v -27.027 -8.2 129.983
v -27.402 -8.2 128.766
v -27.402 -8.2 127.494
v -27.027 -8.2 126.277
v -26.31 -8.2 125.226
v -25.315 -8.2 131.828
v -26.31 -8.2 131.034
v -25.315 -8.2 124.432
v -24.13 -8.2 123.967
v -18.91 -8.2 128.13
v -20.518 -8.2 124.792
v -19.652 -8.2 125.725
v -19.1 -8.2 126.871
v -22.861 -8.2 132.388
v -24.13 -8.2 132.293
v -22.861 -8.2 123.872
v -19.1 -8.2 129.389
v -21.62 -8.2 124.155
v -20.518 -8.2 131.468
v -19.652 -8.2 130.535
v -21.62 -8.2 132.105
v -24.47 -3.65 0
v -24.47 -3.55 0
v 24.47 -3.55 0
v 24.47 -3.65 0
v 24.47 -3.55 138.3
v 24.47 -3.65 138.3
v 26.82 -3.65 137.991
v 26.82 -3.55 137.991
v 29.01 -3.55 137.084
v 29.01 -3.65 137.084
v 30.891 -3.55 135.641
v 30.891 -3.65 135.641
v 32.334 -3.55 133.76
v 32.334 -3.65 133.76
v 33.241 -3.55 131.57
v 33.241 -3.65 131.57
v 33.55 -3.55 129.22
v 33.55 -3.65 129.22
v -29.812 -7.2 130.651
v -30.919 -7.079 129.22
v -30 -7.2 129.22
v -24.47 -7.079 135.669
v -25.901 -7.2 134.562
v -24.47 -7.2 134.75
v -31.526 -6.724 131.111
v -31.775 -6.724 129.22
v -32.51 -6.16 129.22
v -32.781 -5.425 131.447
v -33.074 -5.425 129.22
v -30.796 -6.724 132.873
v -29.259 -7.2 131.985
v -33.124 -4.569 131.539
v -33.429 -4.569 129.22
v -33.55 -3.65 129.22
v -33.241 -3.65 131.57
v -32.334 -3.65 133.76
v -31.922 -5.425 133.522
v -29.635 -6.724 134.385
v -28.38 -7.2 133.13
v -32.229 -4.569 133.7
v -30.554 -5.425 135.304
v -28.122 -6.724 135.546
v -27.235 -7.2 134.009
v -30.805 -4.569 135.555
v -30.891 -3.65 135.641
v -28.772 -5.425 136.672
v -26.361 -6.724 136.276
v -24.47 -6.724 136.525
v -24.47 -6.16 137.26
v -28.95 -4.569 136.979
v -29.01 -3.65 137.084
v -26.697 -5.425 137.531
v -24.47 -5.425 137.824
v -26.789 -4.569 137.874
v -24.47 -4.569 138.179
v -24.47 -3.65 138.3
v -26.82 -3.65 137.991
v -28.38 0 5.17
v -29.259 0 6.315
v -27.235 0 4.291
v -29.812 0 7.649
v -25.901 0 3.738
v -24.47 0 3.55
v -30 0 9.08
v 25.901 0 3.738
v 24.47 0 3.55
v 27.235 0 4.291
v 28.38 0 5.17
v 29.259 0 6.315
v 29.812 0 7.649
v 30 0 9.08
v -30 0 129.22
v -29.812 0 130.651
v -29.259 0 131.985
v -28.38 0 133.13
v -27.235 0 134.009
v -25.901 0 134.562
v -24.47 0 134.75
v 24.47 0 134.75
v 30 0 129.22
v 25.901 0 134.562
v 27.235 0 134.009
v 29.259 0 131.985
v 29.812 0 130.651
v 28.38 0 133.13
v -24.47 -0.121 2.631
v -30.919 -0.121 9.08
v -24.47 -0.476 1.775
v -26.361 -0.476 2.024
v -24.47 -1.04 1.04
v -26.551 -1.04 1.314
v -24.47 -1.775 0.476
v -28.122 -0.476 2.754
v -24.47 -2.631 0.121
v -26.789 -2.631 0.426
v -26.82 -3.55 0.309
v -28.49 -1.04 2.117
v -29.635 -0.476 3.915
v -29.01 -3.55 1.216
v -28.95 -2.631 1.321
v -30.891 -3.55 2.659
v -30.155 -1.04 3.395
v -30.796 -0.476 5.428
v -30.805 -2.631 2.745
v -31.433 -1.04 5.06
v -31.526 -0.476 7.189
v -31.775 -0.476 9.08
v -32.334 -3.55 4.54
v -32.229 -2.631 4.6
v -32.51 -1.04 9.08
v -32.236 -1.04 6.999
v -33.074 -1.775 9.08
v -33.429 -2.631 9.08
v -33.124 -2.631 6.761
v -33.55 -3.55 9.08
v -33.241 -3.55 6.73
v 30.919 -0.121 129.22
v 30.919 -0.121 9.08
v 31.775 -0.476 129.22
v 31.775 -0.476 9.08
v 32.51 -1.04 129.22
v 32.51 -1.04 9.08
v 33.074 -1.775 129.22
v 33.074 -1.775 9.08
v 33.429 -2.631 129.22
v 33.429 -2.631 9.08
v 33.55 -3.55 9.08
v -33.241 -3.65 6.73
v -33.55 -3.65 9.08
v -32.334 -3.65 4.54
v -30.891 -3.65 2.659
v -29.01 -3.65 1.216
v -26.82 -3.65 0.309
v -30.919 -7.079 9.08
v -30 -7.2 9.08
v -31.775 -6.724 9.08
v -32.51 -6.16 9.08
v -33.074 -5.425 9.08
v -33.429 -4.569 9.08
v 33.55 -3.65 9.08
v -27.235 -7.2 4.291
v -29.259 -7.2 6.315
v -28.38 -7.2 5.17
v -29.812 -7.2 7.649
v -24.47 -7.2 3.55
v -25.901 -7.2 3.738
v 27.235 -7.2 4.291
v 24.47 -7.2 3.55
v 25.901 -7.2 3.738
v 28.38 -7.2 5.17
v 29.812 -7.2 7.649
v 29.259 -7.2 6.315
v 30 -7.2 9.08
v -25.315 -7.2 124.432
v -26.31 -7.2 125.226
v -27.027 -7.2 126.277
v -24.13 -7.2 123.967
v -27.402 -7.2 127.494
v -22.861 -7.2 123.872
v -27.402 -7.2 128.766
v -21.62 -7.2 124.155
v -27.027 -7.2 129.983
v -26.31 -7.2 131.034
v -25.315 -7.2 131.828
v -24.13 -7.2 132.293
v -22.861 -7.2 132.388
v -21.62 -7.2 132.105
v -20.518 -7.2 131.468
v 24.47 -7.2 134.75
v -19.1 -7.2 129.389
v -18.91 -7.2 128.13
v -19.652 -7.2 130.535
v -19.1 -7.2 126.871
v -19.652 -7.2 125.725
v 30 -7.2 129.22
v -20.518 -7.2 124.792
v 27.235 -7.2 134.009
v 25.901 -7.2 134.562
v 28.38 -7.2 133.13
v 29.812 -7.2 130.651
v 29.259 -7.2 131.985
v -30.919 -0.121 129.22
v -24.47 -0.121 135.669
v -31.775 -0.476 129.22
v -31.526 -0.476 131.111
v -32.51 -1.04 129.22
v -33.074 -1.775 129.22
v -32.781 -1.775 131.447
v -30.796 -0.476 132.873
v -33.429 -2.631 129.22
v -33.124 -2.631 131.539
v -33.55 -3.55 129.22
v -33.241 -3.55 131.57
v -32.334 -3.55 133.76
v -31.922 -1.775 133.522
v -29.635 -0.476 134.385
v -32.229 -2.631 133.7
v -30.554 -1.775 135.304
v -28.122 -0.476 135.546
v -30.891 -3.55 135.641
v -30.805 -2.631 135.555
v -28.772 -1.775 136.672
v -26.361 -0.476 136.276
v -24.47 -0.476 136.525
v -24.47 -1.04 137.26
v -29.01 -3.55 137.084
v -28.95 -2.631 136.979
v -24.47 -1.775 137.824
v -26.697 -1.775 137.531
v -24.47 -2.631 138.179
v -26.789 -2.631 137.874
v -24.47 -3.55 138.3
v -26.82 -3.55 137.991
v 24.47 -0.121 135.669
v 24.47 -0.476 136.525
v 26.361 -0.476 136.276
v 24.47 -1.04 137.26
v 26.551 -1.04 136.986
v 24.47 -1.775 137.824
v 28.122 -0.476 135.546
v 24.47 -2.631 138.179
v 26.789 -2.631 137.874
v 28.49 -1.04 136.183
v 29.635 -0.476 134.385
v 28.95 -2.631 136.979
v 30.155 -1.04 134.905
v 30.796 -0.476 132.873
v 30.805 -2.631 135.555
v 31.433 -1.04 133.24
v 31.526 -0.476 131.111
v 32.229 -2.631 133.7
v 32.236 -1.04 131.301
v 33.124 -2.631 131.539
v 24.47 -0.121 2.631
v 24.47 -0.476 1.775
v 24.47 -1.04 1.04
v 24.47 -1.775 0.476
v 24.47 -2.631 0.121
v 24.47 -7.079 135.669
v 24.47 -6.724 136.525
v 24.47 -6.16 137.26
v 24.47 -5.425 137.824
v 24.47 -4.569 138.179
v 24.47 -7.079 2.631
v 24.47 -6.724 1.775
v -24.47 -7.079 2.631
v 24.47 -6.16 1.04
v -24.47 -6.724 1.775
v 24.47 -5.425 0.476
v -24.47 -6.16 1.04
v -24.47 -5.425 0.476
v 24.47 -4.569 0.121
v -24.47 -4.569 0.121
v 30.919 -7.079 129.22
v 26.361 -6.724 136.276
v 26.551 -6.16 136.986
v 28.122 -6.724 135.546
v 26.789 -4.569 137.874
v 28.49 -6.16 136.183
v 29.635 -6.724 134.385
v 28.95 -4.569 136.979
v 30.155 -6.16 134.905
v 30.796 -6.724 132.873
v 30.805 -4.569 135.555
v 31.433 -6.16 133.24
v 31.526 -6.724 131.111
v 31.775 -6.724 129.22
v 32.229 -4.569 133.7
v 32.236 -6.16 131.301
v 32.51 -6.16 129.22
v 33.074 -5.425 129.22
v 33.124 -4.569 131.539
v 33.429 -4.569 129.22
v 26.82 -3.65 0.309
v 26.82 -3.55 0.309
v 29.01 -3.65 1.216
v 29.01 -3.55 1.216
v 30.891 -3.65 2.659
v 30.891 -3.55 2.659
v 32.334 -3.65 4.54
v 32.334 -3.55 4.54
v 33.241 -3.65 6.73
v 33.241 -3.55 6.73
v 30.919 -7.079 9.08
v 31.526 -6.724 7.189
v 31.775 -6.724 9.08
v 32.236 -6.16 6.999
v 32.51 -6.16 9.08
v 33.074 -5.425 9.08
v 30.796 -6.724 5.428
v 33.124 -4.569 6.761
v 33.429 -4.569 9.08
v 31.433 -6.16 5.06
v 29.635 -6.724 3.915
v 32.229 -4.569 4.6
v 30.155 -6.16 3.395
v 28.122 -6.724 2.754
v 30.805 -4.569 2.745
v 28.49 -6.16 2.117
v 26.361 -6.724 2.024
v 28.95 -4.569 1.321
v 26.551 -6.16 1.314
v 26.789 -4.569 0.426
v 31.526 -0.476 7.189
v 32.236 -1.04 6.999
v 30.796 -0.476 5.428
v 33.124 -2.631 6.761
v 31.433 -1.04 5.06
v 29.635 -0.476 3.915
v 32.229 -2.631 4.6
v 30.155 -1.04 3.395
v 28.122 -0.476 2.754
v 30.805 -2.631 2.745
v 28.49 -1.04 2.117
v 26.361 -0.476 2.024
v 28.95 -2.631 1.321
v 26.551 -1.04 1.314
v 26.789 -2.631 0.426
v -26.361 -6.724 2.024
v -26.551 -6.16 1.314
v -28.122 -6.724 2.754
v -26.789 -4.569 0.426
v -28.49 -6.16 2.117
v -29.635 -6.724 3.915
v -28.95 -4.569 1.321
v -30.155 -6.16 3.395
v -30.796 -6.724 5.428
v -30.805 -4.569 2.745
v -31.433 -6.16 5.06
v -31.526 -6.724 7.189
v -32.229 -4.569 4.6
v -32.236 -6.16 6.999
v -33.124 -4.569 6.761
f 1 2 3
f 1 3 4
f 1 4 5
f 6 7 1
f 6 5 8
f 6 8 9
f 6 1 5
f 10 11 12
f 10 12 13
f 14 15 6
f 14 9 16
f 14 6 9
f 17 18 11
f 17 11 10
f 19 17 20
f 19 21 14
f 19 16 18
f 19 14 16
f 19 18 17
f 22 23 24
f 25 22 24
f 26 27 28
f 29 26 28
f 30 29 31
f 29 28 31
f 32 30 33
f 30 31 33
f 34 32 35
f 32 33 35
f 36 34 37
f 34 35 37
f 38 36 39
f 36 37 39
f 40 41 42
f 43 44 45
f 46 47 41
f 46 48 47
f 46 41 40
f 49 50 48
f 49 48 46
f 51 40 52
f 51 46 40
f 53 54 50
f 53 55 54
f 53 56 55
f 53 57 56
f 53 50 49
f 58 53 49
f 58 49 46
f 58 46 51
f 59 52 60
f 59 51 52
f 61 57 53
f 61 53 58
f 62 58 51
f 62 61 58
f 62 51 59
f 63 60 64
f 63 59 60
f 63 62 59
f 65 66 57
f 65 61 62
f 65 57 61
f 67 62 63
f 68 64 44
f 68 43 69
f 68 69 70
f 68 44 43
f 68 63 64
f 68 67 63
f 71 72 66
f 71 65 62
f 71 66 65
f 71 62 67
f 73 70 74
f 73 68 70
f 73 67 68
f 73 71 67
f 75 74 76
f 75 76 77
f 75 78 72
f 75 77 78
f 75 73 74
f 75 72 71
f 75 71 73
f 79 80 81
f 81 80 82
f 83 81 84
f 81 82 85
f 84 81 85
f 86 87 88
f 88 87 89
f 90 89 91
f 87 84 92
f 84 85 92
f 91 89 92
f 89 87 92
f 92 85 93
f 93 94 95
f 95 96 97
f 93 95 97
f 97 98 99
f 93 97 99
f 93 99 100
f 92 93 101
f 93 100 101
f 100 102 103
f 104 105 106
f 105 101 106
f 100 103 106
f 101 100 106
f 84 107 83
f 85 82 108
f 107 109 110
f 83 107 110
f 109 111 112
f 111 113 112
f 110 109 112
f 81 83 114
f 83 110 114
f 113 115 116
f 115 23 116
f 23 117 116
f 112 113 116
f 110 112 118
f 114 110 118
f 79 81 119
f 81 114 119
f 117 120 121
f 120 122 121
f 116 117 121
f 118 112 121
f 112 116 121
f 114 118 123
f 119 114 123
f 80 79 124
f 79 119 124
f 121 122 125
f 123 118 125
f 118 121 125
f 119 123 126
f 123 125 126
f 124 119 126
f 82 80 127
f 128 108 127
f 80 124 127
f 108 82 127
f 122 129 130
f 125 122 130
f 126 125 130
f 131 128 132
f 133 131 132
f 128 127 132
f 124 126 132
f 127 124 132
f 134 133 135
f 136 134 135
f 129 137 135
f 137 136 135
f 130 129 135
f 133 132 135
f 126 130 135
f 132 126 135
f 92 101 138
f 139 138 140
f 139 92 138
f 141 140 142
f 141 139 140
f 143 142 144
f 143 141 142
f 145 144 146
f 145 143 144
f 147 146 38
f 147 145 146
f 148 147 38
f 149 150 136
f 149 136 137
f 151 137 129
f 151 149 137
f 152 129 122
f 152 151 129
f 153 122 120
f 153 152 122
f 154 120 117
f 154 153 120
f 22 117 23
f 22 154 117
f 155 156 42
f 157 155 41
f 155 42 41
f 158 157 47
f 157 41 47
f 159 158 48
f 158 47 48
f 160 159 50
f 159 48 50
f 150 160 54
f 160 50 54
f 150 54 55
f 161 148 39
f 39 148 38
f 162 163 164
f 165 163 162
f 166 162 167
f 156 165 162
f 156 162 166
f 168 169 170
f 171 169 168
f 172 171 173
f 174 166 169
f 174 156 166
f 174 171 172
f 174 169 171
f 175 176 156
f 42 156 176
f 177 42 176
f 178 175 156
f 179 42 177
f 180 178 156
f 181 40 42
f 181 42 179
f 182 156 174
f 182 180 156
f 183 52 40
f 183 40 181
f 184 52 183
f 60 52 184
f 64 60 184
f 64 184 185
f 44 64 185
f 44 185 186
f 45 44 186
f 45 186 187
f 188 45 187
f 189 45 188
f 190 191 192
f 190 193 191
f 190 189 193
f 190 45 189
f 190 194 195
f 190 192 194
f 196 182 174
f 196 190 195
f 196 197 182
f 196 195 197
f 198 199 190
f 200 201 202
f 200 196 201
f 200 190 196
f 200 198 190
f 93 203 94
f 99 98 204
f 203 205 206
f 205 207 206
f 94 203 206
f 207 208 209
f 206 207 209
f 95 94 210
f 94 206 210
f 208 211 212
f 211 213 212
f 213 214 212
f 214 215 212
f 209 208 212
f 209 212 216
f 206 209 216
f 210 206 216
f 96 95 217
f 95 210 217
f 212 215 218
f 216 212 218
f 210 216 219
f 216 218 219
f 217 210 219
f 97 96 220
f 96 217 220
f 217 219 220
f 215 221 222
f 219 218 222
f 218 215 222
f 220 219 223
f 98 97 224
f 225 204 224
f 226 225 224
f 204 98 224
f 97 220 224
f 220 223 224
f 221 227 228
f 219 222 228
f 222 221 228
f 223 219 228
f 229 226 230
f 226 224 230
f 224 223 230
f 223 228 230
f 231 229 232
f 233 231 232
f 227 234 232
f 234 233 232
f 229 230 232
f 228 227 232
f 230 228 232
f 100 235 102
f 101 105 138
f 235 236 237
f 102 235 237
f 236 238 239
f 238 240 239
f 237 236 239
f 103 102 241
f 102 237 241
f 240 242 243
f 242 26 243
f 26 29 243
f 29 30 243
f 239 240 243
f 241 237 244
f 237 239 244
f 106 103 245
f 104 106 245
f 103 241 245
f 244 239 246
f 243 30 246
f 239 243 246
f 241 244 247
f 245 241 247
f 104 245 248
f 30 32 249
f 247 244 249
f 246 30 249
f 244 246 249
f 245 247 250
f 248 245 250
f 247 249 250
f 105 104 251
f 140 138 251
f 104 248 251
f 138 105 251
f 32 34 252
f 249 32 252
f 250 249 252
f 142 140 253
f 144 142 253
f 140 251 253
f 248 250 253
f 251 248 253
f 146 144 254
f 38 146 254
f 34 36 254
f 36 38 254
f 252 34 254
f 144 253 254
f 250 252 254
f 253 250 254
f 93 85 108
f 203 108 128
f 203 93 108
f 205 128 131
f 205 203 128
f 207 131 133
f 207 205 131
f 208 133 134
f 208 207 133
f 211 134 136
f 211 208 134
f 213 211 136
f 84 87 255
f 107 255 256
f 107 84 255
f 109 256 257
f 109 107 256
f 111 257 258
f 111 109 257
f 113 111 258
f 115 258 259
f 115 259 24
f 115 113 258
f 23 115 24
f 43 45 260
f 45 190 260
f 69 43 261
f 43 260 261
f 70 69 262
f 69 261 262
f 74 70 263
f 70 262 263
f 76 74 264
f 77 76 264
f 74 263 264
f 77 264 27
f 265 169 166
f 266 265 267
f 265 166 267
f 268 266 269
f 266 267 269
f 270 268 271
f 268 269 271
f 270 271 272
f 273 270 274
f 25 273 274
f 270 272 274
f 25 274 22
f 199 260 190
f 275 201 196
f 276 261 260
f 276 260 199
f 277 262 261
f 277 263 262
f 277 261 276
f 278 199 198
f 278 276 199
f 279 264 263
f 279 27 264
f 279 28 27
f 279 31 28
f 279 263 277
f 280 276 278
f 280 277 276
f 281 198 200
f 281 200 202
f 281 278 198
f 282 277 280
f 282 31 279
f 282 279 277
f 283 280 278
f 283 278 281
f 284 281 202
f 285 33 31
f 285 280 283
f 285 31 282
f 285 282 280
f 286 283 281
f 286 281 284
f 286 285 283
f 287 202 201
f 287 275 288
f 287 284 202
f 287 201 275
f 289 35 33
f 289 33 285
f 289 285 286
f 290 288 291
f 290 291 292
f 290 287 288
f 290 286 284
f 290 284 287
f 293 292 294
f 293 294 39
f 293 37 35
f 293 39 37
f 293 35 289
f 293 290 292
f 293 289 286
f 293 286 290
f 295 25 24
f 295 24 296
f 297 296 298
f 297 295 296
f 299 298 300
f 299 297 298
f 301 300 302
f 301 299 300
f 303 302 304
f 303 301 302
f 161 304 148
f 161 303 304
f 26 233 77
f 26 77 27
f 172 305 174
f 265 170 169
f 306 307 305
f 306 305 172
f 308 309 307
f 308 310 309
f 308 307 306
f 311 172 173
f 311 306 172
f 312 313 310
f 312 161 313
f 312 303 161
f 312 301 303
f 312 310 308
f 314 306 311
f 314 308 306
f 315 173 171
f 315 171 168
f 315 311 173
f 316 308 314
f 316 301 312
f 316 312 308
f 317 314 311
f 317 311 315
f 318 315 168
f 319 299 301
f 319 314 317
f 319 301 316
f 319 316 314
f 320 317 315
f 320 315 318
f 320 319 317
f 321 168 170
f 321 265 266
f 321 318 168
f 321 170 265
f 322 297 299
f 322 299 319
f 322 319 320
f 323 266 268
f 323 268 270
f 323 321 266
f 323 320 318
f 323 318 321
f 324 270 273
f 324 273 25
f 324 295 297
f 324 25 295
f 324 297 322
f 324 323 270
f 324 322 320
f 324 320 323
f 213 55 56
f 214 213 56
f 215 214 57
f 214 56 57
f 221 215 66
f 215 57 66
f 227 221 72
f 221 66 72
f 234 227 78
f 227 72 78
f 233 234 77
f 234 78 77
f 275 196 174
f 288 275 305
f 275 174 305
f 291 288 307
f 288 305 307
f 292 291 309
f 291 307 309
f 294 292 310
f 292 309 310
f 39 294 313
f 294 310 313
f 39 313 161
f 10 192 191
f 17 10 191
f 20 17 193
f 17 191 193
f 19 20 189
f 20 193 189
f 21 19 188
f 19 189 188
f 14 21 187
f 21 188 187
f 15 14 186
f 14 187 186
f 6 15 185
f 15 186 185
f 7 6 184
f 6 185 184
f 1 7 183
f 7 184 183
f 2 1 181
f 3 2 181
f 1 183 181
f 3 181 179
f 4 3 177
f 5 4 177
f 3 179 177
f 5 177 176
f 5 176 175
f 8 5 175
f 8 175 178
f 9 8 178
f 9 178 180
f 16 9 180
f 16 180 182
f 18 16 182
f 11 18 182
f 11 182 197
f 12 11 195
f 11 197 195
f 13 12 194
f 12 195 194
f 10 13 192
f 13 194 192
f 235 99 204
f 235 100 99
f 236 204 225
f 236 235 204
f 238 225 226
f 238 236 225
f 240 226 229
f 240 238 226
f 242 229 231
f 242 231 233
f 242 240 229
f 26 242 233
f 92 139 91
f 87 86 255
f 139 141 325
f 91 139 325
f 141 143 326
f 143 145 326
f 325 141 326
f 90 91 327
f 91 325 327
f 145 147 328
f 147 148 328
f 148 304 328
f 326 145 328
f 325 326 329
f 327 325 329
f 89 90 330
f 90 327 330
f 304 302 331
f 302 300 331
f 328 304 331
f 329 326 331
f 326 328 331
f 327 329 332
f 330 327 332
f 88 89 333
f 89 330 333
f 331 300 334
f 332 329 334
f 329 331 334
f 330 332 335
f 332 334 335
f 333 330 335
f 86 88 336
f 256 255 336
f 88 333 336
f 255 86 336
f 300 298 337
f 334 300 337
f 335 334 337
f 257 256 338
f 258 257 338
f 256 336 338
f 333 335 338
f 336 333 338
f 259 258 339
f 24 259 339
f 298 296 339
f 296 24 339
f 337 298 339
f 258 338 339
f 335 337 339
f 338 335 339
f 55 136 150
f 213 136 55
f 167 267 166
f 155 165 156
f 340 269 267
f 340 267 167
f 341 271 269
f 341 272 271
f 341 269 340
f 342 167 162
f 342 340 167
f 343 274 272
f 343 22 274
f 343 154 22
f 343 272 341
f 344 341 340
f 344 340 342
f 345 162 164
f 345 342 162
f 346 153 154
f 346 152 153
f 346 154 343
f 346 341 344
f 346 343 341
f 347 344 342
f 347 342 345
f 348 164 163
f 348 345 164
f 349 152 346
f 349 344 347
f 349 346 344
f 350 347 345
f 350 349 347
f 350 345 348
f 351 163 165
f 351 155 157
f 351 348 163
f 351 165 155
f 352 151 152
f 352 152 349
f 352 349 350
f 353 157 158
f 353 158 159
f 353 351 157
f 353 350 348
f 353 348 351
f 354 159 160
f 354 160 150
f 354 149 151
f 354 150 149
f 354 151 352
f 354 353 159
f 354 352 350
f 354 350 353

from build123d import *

# Parameters (mm, degrees)
F0_W     = 67.1
F0_H     = 138.3
F1_DEPTH = 7.2
F2_R     = 4.27
F3_DEPTH = 1
F4_R     = 9.08
F5_R     = 3.55


with BuildPart() as f1:
    # F0 (on Front) → F1 (new body)
    with BuildSketch(Plane.XZ):
        with Locations((0, 69.15)):
            Rectangle(F0_W, F0_H)
    extrude(amount=F1_DEPTH)

    # F2 (on face) → F3 (join)
    with BuildSketch(Plane.XZ.offset(7.2)):
        with Locations((-23.18, 128.13)):
            Circle(F2_R)
    extrude(amount=F3_DEPTH)

    # F4
    f4_edges = [f1.edges().sort_by_distance(p)[0] for p in [
        (-33.55, -3.6, 138.3),
        (33.55, -3.6, 138.3),
        (33.55, -3.6, 0),
        (-33.55, -3.6, 0),
    ]]
    fillet(f4_edges, radius=F4_R)

    # F5
    f5_edges = [f1.edges().sort_by_distance(p)[0] for p in [
        (0, -7.2, 138.3),
        (0, 0, 138.3),
    ]]
    fillet(f5_edges, radius=F5_R)


solid = f1.part
